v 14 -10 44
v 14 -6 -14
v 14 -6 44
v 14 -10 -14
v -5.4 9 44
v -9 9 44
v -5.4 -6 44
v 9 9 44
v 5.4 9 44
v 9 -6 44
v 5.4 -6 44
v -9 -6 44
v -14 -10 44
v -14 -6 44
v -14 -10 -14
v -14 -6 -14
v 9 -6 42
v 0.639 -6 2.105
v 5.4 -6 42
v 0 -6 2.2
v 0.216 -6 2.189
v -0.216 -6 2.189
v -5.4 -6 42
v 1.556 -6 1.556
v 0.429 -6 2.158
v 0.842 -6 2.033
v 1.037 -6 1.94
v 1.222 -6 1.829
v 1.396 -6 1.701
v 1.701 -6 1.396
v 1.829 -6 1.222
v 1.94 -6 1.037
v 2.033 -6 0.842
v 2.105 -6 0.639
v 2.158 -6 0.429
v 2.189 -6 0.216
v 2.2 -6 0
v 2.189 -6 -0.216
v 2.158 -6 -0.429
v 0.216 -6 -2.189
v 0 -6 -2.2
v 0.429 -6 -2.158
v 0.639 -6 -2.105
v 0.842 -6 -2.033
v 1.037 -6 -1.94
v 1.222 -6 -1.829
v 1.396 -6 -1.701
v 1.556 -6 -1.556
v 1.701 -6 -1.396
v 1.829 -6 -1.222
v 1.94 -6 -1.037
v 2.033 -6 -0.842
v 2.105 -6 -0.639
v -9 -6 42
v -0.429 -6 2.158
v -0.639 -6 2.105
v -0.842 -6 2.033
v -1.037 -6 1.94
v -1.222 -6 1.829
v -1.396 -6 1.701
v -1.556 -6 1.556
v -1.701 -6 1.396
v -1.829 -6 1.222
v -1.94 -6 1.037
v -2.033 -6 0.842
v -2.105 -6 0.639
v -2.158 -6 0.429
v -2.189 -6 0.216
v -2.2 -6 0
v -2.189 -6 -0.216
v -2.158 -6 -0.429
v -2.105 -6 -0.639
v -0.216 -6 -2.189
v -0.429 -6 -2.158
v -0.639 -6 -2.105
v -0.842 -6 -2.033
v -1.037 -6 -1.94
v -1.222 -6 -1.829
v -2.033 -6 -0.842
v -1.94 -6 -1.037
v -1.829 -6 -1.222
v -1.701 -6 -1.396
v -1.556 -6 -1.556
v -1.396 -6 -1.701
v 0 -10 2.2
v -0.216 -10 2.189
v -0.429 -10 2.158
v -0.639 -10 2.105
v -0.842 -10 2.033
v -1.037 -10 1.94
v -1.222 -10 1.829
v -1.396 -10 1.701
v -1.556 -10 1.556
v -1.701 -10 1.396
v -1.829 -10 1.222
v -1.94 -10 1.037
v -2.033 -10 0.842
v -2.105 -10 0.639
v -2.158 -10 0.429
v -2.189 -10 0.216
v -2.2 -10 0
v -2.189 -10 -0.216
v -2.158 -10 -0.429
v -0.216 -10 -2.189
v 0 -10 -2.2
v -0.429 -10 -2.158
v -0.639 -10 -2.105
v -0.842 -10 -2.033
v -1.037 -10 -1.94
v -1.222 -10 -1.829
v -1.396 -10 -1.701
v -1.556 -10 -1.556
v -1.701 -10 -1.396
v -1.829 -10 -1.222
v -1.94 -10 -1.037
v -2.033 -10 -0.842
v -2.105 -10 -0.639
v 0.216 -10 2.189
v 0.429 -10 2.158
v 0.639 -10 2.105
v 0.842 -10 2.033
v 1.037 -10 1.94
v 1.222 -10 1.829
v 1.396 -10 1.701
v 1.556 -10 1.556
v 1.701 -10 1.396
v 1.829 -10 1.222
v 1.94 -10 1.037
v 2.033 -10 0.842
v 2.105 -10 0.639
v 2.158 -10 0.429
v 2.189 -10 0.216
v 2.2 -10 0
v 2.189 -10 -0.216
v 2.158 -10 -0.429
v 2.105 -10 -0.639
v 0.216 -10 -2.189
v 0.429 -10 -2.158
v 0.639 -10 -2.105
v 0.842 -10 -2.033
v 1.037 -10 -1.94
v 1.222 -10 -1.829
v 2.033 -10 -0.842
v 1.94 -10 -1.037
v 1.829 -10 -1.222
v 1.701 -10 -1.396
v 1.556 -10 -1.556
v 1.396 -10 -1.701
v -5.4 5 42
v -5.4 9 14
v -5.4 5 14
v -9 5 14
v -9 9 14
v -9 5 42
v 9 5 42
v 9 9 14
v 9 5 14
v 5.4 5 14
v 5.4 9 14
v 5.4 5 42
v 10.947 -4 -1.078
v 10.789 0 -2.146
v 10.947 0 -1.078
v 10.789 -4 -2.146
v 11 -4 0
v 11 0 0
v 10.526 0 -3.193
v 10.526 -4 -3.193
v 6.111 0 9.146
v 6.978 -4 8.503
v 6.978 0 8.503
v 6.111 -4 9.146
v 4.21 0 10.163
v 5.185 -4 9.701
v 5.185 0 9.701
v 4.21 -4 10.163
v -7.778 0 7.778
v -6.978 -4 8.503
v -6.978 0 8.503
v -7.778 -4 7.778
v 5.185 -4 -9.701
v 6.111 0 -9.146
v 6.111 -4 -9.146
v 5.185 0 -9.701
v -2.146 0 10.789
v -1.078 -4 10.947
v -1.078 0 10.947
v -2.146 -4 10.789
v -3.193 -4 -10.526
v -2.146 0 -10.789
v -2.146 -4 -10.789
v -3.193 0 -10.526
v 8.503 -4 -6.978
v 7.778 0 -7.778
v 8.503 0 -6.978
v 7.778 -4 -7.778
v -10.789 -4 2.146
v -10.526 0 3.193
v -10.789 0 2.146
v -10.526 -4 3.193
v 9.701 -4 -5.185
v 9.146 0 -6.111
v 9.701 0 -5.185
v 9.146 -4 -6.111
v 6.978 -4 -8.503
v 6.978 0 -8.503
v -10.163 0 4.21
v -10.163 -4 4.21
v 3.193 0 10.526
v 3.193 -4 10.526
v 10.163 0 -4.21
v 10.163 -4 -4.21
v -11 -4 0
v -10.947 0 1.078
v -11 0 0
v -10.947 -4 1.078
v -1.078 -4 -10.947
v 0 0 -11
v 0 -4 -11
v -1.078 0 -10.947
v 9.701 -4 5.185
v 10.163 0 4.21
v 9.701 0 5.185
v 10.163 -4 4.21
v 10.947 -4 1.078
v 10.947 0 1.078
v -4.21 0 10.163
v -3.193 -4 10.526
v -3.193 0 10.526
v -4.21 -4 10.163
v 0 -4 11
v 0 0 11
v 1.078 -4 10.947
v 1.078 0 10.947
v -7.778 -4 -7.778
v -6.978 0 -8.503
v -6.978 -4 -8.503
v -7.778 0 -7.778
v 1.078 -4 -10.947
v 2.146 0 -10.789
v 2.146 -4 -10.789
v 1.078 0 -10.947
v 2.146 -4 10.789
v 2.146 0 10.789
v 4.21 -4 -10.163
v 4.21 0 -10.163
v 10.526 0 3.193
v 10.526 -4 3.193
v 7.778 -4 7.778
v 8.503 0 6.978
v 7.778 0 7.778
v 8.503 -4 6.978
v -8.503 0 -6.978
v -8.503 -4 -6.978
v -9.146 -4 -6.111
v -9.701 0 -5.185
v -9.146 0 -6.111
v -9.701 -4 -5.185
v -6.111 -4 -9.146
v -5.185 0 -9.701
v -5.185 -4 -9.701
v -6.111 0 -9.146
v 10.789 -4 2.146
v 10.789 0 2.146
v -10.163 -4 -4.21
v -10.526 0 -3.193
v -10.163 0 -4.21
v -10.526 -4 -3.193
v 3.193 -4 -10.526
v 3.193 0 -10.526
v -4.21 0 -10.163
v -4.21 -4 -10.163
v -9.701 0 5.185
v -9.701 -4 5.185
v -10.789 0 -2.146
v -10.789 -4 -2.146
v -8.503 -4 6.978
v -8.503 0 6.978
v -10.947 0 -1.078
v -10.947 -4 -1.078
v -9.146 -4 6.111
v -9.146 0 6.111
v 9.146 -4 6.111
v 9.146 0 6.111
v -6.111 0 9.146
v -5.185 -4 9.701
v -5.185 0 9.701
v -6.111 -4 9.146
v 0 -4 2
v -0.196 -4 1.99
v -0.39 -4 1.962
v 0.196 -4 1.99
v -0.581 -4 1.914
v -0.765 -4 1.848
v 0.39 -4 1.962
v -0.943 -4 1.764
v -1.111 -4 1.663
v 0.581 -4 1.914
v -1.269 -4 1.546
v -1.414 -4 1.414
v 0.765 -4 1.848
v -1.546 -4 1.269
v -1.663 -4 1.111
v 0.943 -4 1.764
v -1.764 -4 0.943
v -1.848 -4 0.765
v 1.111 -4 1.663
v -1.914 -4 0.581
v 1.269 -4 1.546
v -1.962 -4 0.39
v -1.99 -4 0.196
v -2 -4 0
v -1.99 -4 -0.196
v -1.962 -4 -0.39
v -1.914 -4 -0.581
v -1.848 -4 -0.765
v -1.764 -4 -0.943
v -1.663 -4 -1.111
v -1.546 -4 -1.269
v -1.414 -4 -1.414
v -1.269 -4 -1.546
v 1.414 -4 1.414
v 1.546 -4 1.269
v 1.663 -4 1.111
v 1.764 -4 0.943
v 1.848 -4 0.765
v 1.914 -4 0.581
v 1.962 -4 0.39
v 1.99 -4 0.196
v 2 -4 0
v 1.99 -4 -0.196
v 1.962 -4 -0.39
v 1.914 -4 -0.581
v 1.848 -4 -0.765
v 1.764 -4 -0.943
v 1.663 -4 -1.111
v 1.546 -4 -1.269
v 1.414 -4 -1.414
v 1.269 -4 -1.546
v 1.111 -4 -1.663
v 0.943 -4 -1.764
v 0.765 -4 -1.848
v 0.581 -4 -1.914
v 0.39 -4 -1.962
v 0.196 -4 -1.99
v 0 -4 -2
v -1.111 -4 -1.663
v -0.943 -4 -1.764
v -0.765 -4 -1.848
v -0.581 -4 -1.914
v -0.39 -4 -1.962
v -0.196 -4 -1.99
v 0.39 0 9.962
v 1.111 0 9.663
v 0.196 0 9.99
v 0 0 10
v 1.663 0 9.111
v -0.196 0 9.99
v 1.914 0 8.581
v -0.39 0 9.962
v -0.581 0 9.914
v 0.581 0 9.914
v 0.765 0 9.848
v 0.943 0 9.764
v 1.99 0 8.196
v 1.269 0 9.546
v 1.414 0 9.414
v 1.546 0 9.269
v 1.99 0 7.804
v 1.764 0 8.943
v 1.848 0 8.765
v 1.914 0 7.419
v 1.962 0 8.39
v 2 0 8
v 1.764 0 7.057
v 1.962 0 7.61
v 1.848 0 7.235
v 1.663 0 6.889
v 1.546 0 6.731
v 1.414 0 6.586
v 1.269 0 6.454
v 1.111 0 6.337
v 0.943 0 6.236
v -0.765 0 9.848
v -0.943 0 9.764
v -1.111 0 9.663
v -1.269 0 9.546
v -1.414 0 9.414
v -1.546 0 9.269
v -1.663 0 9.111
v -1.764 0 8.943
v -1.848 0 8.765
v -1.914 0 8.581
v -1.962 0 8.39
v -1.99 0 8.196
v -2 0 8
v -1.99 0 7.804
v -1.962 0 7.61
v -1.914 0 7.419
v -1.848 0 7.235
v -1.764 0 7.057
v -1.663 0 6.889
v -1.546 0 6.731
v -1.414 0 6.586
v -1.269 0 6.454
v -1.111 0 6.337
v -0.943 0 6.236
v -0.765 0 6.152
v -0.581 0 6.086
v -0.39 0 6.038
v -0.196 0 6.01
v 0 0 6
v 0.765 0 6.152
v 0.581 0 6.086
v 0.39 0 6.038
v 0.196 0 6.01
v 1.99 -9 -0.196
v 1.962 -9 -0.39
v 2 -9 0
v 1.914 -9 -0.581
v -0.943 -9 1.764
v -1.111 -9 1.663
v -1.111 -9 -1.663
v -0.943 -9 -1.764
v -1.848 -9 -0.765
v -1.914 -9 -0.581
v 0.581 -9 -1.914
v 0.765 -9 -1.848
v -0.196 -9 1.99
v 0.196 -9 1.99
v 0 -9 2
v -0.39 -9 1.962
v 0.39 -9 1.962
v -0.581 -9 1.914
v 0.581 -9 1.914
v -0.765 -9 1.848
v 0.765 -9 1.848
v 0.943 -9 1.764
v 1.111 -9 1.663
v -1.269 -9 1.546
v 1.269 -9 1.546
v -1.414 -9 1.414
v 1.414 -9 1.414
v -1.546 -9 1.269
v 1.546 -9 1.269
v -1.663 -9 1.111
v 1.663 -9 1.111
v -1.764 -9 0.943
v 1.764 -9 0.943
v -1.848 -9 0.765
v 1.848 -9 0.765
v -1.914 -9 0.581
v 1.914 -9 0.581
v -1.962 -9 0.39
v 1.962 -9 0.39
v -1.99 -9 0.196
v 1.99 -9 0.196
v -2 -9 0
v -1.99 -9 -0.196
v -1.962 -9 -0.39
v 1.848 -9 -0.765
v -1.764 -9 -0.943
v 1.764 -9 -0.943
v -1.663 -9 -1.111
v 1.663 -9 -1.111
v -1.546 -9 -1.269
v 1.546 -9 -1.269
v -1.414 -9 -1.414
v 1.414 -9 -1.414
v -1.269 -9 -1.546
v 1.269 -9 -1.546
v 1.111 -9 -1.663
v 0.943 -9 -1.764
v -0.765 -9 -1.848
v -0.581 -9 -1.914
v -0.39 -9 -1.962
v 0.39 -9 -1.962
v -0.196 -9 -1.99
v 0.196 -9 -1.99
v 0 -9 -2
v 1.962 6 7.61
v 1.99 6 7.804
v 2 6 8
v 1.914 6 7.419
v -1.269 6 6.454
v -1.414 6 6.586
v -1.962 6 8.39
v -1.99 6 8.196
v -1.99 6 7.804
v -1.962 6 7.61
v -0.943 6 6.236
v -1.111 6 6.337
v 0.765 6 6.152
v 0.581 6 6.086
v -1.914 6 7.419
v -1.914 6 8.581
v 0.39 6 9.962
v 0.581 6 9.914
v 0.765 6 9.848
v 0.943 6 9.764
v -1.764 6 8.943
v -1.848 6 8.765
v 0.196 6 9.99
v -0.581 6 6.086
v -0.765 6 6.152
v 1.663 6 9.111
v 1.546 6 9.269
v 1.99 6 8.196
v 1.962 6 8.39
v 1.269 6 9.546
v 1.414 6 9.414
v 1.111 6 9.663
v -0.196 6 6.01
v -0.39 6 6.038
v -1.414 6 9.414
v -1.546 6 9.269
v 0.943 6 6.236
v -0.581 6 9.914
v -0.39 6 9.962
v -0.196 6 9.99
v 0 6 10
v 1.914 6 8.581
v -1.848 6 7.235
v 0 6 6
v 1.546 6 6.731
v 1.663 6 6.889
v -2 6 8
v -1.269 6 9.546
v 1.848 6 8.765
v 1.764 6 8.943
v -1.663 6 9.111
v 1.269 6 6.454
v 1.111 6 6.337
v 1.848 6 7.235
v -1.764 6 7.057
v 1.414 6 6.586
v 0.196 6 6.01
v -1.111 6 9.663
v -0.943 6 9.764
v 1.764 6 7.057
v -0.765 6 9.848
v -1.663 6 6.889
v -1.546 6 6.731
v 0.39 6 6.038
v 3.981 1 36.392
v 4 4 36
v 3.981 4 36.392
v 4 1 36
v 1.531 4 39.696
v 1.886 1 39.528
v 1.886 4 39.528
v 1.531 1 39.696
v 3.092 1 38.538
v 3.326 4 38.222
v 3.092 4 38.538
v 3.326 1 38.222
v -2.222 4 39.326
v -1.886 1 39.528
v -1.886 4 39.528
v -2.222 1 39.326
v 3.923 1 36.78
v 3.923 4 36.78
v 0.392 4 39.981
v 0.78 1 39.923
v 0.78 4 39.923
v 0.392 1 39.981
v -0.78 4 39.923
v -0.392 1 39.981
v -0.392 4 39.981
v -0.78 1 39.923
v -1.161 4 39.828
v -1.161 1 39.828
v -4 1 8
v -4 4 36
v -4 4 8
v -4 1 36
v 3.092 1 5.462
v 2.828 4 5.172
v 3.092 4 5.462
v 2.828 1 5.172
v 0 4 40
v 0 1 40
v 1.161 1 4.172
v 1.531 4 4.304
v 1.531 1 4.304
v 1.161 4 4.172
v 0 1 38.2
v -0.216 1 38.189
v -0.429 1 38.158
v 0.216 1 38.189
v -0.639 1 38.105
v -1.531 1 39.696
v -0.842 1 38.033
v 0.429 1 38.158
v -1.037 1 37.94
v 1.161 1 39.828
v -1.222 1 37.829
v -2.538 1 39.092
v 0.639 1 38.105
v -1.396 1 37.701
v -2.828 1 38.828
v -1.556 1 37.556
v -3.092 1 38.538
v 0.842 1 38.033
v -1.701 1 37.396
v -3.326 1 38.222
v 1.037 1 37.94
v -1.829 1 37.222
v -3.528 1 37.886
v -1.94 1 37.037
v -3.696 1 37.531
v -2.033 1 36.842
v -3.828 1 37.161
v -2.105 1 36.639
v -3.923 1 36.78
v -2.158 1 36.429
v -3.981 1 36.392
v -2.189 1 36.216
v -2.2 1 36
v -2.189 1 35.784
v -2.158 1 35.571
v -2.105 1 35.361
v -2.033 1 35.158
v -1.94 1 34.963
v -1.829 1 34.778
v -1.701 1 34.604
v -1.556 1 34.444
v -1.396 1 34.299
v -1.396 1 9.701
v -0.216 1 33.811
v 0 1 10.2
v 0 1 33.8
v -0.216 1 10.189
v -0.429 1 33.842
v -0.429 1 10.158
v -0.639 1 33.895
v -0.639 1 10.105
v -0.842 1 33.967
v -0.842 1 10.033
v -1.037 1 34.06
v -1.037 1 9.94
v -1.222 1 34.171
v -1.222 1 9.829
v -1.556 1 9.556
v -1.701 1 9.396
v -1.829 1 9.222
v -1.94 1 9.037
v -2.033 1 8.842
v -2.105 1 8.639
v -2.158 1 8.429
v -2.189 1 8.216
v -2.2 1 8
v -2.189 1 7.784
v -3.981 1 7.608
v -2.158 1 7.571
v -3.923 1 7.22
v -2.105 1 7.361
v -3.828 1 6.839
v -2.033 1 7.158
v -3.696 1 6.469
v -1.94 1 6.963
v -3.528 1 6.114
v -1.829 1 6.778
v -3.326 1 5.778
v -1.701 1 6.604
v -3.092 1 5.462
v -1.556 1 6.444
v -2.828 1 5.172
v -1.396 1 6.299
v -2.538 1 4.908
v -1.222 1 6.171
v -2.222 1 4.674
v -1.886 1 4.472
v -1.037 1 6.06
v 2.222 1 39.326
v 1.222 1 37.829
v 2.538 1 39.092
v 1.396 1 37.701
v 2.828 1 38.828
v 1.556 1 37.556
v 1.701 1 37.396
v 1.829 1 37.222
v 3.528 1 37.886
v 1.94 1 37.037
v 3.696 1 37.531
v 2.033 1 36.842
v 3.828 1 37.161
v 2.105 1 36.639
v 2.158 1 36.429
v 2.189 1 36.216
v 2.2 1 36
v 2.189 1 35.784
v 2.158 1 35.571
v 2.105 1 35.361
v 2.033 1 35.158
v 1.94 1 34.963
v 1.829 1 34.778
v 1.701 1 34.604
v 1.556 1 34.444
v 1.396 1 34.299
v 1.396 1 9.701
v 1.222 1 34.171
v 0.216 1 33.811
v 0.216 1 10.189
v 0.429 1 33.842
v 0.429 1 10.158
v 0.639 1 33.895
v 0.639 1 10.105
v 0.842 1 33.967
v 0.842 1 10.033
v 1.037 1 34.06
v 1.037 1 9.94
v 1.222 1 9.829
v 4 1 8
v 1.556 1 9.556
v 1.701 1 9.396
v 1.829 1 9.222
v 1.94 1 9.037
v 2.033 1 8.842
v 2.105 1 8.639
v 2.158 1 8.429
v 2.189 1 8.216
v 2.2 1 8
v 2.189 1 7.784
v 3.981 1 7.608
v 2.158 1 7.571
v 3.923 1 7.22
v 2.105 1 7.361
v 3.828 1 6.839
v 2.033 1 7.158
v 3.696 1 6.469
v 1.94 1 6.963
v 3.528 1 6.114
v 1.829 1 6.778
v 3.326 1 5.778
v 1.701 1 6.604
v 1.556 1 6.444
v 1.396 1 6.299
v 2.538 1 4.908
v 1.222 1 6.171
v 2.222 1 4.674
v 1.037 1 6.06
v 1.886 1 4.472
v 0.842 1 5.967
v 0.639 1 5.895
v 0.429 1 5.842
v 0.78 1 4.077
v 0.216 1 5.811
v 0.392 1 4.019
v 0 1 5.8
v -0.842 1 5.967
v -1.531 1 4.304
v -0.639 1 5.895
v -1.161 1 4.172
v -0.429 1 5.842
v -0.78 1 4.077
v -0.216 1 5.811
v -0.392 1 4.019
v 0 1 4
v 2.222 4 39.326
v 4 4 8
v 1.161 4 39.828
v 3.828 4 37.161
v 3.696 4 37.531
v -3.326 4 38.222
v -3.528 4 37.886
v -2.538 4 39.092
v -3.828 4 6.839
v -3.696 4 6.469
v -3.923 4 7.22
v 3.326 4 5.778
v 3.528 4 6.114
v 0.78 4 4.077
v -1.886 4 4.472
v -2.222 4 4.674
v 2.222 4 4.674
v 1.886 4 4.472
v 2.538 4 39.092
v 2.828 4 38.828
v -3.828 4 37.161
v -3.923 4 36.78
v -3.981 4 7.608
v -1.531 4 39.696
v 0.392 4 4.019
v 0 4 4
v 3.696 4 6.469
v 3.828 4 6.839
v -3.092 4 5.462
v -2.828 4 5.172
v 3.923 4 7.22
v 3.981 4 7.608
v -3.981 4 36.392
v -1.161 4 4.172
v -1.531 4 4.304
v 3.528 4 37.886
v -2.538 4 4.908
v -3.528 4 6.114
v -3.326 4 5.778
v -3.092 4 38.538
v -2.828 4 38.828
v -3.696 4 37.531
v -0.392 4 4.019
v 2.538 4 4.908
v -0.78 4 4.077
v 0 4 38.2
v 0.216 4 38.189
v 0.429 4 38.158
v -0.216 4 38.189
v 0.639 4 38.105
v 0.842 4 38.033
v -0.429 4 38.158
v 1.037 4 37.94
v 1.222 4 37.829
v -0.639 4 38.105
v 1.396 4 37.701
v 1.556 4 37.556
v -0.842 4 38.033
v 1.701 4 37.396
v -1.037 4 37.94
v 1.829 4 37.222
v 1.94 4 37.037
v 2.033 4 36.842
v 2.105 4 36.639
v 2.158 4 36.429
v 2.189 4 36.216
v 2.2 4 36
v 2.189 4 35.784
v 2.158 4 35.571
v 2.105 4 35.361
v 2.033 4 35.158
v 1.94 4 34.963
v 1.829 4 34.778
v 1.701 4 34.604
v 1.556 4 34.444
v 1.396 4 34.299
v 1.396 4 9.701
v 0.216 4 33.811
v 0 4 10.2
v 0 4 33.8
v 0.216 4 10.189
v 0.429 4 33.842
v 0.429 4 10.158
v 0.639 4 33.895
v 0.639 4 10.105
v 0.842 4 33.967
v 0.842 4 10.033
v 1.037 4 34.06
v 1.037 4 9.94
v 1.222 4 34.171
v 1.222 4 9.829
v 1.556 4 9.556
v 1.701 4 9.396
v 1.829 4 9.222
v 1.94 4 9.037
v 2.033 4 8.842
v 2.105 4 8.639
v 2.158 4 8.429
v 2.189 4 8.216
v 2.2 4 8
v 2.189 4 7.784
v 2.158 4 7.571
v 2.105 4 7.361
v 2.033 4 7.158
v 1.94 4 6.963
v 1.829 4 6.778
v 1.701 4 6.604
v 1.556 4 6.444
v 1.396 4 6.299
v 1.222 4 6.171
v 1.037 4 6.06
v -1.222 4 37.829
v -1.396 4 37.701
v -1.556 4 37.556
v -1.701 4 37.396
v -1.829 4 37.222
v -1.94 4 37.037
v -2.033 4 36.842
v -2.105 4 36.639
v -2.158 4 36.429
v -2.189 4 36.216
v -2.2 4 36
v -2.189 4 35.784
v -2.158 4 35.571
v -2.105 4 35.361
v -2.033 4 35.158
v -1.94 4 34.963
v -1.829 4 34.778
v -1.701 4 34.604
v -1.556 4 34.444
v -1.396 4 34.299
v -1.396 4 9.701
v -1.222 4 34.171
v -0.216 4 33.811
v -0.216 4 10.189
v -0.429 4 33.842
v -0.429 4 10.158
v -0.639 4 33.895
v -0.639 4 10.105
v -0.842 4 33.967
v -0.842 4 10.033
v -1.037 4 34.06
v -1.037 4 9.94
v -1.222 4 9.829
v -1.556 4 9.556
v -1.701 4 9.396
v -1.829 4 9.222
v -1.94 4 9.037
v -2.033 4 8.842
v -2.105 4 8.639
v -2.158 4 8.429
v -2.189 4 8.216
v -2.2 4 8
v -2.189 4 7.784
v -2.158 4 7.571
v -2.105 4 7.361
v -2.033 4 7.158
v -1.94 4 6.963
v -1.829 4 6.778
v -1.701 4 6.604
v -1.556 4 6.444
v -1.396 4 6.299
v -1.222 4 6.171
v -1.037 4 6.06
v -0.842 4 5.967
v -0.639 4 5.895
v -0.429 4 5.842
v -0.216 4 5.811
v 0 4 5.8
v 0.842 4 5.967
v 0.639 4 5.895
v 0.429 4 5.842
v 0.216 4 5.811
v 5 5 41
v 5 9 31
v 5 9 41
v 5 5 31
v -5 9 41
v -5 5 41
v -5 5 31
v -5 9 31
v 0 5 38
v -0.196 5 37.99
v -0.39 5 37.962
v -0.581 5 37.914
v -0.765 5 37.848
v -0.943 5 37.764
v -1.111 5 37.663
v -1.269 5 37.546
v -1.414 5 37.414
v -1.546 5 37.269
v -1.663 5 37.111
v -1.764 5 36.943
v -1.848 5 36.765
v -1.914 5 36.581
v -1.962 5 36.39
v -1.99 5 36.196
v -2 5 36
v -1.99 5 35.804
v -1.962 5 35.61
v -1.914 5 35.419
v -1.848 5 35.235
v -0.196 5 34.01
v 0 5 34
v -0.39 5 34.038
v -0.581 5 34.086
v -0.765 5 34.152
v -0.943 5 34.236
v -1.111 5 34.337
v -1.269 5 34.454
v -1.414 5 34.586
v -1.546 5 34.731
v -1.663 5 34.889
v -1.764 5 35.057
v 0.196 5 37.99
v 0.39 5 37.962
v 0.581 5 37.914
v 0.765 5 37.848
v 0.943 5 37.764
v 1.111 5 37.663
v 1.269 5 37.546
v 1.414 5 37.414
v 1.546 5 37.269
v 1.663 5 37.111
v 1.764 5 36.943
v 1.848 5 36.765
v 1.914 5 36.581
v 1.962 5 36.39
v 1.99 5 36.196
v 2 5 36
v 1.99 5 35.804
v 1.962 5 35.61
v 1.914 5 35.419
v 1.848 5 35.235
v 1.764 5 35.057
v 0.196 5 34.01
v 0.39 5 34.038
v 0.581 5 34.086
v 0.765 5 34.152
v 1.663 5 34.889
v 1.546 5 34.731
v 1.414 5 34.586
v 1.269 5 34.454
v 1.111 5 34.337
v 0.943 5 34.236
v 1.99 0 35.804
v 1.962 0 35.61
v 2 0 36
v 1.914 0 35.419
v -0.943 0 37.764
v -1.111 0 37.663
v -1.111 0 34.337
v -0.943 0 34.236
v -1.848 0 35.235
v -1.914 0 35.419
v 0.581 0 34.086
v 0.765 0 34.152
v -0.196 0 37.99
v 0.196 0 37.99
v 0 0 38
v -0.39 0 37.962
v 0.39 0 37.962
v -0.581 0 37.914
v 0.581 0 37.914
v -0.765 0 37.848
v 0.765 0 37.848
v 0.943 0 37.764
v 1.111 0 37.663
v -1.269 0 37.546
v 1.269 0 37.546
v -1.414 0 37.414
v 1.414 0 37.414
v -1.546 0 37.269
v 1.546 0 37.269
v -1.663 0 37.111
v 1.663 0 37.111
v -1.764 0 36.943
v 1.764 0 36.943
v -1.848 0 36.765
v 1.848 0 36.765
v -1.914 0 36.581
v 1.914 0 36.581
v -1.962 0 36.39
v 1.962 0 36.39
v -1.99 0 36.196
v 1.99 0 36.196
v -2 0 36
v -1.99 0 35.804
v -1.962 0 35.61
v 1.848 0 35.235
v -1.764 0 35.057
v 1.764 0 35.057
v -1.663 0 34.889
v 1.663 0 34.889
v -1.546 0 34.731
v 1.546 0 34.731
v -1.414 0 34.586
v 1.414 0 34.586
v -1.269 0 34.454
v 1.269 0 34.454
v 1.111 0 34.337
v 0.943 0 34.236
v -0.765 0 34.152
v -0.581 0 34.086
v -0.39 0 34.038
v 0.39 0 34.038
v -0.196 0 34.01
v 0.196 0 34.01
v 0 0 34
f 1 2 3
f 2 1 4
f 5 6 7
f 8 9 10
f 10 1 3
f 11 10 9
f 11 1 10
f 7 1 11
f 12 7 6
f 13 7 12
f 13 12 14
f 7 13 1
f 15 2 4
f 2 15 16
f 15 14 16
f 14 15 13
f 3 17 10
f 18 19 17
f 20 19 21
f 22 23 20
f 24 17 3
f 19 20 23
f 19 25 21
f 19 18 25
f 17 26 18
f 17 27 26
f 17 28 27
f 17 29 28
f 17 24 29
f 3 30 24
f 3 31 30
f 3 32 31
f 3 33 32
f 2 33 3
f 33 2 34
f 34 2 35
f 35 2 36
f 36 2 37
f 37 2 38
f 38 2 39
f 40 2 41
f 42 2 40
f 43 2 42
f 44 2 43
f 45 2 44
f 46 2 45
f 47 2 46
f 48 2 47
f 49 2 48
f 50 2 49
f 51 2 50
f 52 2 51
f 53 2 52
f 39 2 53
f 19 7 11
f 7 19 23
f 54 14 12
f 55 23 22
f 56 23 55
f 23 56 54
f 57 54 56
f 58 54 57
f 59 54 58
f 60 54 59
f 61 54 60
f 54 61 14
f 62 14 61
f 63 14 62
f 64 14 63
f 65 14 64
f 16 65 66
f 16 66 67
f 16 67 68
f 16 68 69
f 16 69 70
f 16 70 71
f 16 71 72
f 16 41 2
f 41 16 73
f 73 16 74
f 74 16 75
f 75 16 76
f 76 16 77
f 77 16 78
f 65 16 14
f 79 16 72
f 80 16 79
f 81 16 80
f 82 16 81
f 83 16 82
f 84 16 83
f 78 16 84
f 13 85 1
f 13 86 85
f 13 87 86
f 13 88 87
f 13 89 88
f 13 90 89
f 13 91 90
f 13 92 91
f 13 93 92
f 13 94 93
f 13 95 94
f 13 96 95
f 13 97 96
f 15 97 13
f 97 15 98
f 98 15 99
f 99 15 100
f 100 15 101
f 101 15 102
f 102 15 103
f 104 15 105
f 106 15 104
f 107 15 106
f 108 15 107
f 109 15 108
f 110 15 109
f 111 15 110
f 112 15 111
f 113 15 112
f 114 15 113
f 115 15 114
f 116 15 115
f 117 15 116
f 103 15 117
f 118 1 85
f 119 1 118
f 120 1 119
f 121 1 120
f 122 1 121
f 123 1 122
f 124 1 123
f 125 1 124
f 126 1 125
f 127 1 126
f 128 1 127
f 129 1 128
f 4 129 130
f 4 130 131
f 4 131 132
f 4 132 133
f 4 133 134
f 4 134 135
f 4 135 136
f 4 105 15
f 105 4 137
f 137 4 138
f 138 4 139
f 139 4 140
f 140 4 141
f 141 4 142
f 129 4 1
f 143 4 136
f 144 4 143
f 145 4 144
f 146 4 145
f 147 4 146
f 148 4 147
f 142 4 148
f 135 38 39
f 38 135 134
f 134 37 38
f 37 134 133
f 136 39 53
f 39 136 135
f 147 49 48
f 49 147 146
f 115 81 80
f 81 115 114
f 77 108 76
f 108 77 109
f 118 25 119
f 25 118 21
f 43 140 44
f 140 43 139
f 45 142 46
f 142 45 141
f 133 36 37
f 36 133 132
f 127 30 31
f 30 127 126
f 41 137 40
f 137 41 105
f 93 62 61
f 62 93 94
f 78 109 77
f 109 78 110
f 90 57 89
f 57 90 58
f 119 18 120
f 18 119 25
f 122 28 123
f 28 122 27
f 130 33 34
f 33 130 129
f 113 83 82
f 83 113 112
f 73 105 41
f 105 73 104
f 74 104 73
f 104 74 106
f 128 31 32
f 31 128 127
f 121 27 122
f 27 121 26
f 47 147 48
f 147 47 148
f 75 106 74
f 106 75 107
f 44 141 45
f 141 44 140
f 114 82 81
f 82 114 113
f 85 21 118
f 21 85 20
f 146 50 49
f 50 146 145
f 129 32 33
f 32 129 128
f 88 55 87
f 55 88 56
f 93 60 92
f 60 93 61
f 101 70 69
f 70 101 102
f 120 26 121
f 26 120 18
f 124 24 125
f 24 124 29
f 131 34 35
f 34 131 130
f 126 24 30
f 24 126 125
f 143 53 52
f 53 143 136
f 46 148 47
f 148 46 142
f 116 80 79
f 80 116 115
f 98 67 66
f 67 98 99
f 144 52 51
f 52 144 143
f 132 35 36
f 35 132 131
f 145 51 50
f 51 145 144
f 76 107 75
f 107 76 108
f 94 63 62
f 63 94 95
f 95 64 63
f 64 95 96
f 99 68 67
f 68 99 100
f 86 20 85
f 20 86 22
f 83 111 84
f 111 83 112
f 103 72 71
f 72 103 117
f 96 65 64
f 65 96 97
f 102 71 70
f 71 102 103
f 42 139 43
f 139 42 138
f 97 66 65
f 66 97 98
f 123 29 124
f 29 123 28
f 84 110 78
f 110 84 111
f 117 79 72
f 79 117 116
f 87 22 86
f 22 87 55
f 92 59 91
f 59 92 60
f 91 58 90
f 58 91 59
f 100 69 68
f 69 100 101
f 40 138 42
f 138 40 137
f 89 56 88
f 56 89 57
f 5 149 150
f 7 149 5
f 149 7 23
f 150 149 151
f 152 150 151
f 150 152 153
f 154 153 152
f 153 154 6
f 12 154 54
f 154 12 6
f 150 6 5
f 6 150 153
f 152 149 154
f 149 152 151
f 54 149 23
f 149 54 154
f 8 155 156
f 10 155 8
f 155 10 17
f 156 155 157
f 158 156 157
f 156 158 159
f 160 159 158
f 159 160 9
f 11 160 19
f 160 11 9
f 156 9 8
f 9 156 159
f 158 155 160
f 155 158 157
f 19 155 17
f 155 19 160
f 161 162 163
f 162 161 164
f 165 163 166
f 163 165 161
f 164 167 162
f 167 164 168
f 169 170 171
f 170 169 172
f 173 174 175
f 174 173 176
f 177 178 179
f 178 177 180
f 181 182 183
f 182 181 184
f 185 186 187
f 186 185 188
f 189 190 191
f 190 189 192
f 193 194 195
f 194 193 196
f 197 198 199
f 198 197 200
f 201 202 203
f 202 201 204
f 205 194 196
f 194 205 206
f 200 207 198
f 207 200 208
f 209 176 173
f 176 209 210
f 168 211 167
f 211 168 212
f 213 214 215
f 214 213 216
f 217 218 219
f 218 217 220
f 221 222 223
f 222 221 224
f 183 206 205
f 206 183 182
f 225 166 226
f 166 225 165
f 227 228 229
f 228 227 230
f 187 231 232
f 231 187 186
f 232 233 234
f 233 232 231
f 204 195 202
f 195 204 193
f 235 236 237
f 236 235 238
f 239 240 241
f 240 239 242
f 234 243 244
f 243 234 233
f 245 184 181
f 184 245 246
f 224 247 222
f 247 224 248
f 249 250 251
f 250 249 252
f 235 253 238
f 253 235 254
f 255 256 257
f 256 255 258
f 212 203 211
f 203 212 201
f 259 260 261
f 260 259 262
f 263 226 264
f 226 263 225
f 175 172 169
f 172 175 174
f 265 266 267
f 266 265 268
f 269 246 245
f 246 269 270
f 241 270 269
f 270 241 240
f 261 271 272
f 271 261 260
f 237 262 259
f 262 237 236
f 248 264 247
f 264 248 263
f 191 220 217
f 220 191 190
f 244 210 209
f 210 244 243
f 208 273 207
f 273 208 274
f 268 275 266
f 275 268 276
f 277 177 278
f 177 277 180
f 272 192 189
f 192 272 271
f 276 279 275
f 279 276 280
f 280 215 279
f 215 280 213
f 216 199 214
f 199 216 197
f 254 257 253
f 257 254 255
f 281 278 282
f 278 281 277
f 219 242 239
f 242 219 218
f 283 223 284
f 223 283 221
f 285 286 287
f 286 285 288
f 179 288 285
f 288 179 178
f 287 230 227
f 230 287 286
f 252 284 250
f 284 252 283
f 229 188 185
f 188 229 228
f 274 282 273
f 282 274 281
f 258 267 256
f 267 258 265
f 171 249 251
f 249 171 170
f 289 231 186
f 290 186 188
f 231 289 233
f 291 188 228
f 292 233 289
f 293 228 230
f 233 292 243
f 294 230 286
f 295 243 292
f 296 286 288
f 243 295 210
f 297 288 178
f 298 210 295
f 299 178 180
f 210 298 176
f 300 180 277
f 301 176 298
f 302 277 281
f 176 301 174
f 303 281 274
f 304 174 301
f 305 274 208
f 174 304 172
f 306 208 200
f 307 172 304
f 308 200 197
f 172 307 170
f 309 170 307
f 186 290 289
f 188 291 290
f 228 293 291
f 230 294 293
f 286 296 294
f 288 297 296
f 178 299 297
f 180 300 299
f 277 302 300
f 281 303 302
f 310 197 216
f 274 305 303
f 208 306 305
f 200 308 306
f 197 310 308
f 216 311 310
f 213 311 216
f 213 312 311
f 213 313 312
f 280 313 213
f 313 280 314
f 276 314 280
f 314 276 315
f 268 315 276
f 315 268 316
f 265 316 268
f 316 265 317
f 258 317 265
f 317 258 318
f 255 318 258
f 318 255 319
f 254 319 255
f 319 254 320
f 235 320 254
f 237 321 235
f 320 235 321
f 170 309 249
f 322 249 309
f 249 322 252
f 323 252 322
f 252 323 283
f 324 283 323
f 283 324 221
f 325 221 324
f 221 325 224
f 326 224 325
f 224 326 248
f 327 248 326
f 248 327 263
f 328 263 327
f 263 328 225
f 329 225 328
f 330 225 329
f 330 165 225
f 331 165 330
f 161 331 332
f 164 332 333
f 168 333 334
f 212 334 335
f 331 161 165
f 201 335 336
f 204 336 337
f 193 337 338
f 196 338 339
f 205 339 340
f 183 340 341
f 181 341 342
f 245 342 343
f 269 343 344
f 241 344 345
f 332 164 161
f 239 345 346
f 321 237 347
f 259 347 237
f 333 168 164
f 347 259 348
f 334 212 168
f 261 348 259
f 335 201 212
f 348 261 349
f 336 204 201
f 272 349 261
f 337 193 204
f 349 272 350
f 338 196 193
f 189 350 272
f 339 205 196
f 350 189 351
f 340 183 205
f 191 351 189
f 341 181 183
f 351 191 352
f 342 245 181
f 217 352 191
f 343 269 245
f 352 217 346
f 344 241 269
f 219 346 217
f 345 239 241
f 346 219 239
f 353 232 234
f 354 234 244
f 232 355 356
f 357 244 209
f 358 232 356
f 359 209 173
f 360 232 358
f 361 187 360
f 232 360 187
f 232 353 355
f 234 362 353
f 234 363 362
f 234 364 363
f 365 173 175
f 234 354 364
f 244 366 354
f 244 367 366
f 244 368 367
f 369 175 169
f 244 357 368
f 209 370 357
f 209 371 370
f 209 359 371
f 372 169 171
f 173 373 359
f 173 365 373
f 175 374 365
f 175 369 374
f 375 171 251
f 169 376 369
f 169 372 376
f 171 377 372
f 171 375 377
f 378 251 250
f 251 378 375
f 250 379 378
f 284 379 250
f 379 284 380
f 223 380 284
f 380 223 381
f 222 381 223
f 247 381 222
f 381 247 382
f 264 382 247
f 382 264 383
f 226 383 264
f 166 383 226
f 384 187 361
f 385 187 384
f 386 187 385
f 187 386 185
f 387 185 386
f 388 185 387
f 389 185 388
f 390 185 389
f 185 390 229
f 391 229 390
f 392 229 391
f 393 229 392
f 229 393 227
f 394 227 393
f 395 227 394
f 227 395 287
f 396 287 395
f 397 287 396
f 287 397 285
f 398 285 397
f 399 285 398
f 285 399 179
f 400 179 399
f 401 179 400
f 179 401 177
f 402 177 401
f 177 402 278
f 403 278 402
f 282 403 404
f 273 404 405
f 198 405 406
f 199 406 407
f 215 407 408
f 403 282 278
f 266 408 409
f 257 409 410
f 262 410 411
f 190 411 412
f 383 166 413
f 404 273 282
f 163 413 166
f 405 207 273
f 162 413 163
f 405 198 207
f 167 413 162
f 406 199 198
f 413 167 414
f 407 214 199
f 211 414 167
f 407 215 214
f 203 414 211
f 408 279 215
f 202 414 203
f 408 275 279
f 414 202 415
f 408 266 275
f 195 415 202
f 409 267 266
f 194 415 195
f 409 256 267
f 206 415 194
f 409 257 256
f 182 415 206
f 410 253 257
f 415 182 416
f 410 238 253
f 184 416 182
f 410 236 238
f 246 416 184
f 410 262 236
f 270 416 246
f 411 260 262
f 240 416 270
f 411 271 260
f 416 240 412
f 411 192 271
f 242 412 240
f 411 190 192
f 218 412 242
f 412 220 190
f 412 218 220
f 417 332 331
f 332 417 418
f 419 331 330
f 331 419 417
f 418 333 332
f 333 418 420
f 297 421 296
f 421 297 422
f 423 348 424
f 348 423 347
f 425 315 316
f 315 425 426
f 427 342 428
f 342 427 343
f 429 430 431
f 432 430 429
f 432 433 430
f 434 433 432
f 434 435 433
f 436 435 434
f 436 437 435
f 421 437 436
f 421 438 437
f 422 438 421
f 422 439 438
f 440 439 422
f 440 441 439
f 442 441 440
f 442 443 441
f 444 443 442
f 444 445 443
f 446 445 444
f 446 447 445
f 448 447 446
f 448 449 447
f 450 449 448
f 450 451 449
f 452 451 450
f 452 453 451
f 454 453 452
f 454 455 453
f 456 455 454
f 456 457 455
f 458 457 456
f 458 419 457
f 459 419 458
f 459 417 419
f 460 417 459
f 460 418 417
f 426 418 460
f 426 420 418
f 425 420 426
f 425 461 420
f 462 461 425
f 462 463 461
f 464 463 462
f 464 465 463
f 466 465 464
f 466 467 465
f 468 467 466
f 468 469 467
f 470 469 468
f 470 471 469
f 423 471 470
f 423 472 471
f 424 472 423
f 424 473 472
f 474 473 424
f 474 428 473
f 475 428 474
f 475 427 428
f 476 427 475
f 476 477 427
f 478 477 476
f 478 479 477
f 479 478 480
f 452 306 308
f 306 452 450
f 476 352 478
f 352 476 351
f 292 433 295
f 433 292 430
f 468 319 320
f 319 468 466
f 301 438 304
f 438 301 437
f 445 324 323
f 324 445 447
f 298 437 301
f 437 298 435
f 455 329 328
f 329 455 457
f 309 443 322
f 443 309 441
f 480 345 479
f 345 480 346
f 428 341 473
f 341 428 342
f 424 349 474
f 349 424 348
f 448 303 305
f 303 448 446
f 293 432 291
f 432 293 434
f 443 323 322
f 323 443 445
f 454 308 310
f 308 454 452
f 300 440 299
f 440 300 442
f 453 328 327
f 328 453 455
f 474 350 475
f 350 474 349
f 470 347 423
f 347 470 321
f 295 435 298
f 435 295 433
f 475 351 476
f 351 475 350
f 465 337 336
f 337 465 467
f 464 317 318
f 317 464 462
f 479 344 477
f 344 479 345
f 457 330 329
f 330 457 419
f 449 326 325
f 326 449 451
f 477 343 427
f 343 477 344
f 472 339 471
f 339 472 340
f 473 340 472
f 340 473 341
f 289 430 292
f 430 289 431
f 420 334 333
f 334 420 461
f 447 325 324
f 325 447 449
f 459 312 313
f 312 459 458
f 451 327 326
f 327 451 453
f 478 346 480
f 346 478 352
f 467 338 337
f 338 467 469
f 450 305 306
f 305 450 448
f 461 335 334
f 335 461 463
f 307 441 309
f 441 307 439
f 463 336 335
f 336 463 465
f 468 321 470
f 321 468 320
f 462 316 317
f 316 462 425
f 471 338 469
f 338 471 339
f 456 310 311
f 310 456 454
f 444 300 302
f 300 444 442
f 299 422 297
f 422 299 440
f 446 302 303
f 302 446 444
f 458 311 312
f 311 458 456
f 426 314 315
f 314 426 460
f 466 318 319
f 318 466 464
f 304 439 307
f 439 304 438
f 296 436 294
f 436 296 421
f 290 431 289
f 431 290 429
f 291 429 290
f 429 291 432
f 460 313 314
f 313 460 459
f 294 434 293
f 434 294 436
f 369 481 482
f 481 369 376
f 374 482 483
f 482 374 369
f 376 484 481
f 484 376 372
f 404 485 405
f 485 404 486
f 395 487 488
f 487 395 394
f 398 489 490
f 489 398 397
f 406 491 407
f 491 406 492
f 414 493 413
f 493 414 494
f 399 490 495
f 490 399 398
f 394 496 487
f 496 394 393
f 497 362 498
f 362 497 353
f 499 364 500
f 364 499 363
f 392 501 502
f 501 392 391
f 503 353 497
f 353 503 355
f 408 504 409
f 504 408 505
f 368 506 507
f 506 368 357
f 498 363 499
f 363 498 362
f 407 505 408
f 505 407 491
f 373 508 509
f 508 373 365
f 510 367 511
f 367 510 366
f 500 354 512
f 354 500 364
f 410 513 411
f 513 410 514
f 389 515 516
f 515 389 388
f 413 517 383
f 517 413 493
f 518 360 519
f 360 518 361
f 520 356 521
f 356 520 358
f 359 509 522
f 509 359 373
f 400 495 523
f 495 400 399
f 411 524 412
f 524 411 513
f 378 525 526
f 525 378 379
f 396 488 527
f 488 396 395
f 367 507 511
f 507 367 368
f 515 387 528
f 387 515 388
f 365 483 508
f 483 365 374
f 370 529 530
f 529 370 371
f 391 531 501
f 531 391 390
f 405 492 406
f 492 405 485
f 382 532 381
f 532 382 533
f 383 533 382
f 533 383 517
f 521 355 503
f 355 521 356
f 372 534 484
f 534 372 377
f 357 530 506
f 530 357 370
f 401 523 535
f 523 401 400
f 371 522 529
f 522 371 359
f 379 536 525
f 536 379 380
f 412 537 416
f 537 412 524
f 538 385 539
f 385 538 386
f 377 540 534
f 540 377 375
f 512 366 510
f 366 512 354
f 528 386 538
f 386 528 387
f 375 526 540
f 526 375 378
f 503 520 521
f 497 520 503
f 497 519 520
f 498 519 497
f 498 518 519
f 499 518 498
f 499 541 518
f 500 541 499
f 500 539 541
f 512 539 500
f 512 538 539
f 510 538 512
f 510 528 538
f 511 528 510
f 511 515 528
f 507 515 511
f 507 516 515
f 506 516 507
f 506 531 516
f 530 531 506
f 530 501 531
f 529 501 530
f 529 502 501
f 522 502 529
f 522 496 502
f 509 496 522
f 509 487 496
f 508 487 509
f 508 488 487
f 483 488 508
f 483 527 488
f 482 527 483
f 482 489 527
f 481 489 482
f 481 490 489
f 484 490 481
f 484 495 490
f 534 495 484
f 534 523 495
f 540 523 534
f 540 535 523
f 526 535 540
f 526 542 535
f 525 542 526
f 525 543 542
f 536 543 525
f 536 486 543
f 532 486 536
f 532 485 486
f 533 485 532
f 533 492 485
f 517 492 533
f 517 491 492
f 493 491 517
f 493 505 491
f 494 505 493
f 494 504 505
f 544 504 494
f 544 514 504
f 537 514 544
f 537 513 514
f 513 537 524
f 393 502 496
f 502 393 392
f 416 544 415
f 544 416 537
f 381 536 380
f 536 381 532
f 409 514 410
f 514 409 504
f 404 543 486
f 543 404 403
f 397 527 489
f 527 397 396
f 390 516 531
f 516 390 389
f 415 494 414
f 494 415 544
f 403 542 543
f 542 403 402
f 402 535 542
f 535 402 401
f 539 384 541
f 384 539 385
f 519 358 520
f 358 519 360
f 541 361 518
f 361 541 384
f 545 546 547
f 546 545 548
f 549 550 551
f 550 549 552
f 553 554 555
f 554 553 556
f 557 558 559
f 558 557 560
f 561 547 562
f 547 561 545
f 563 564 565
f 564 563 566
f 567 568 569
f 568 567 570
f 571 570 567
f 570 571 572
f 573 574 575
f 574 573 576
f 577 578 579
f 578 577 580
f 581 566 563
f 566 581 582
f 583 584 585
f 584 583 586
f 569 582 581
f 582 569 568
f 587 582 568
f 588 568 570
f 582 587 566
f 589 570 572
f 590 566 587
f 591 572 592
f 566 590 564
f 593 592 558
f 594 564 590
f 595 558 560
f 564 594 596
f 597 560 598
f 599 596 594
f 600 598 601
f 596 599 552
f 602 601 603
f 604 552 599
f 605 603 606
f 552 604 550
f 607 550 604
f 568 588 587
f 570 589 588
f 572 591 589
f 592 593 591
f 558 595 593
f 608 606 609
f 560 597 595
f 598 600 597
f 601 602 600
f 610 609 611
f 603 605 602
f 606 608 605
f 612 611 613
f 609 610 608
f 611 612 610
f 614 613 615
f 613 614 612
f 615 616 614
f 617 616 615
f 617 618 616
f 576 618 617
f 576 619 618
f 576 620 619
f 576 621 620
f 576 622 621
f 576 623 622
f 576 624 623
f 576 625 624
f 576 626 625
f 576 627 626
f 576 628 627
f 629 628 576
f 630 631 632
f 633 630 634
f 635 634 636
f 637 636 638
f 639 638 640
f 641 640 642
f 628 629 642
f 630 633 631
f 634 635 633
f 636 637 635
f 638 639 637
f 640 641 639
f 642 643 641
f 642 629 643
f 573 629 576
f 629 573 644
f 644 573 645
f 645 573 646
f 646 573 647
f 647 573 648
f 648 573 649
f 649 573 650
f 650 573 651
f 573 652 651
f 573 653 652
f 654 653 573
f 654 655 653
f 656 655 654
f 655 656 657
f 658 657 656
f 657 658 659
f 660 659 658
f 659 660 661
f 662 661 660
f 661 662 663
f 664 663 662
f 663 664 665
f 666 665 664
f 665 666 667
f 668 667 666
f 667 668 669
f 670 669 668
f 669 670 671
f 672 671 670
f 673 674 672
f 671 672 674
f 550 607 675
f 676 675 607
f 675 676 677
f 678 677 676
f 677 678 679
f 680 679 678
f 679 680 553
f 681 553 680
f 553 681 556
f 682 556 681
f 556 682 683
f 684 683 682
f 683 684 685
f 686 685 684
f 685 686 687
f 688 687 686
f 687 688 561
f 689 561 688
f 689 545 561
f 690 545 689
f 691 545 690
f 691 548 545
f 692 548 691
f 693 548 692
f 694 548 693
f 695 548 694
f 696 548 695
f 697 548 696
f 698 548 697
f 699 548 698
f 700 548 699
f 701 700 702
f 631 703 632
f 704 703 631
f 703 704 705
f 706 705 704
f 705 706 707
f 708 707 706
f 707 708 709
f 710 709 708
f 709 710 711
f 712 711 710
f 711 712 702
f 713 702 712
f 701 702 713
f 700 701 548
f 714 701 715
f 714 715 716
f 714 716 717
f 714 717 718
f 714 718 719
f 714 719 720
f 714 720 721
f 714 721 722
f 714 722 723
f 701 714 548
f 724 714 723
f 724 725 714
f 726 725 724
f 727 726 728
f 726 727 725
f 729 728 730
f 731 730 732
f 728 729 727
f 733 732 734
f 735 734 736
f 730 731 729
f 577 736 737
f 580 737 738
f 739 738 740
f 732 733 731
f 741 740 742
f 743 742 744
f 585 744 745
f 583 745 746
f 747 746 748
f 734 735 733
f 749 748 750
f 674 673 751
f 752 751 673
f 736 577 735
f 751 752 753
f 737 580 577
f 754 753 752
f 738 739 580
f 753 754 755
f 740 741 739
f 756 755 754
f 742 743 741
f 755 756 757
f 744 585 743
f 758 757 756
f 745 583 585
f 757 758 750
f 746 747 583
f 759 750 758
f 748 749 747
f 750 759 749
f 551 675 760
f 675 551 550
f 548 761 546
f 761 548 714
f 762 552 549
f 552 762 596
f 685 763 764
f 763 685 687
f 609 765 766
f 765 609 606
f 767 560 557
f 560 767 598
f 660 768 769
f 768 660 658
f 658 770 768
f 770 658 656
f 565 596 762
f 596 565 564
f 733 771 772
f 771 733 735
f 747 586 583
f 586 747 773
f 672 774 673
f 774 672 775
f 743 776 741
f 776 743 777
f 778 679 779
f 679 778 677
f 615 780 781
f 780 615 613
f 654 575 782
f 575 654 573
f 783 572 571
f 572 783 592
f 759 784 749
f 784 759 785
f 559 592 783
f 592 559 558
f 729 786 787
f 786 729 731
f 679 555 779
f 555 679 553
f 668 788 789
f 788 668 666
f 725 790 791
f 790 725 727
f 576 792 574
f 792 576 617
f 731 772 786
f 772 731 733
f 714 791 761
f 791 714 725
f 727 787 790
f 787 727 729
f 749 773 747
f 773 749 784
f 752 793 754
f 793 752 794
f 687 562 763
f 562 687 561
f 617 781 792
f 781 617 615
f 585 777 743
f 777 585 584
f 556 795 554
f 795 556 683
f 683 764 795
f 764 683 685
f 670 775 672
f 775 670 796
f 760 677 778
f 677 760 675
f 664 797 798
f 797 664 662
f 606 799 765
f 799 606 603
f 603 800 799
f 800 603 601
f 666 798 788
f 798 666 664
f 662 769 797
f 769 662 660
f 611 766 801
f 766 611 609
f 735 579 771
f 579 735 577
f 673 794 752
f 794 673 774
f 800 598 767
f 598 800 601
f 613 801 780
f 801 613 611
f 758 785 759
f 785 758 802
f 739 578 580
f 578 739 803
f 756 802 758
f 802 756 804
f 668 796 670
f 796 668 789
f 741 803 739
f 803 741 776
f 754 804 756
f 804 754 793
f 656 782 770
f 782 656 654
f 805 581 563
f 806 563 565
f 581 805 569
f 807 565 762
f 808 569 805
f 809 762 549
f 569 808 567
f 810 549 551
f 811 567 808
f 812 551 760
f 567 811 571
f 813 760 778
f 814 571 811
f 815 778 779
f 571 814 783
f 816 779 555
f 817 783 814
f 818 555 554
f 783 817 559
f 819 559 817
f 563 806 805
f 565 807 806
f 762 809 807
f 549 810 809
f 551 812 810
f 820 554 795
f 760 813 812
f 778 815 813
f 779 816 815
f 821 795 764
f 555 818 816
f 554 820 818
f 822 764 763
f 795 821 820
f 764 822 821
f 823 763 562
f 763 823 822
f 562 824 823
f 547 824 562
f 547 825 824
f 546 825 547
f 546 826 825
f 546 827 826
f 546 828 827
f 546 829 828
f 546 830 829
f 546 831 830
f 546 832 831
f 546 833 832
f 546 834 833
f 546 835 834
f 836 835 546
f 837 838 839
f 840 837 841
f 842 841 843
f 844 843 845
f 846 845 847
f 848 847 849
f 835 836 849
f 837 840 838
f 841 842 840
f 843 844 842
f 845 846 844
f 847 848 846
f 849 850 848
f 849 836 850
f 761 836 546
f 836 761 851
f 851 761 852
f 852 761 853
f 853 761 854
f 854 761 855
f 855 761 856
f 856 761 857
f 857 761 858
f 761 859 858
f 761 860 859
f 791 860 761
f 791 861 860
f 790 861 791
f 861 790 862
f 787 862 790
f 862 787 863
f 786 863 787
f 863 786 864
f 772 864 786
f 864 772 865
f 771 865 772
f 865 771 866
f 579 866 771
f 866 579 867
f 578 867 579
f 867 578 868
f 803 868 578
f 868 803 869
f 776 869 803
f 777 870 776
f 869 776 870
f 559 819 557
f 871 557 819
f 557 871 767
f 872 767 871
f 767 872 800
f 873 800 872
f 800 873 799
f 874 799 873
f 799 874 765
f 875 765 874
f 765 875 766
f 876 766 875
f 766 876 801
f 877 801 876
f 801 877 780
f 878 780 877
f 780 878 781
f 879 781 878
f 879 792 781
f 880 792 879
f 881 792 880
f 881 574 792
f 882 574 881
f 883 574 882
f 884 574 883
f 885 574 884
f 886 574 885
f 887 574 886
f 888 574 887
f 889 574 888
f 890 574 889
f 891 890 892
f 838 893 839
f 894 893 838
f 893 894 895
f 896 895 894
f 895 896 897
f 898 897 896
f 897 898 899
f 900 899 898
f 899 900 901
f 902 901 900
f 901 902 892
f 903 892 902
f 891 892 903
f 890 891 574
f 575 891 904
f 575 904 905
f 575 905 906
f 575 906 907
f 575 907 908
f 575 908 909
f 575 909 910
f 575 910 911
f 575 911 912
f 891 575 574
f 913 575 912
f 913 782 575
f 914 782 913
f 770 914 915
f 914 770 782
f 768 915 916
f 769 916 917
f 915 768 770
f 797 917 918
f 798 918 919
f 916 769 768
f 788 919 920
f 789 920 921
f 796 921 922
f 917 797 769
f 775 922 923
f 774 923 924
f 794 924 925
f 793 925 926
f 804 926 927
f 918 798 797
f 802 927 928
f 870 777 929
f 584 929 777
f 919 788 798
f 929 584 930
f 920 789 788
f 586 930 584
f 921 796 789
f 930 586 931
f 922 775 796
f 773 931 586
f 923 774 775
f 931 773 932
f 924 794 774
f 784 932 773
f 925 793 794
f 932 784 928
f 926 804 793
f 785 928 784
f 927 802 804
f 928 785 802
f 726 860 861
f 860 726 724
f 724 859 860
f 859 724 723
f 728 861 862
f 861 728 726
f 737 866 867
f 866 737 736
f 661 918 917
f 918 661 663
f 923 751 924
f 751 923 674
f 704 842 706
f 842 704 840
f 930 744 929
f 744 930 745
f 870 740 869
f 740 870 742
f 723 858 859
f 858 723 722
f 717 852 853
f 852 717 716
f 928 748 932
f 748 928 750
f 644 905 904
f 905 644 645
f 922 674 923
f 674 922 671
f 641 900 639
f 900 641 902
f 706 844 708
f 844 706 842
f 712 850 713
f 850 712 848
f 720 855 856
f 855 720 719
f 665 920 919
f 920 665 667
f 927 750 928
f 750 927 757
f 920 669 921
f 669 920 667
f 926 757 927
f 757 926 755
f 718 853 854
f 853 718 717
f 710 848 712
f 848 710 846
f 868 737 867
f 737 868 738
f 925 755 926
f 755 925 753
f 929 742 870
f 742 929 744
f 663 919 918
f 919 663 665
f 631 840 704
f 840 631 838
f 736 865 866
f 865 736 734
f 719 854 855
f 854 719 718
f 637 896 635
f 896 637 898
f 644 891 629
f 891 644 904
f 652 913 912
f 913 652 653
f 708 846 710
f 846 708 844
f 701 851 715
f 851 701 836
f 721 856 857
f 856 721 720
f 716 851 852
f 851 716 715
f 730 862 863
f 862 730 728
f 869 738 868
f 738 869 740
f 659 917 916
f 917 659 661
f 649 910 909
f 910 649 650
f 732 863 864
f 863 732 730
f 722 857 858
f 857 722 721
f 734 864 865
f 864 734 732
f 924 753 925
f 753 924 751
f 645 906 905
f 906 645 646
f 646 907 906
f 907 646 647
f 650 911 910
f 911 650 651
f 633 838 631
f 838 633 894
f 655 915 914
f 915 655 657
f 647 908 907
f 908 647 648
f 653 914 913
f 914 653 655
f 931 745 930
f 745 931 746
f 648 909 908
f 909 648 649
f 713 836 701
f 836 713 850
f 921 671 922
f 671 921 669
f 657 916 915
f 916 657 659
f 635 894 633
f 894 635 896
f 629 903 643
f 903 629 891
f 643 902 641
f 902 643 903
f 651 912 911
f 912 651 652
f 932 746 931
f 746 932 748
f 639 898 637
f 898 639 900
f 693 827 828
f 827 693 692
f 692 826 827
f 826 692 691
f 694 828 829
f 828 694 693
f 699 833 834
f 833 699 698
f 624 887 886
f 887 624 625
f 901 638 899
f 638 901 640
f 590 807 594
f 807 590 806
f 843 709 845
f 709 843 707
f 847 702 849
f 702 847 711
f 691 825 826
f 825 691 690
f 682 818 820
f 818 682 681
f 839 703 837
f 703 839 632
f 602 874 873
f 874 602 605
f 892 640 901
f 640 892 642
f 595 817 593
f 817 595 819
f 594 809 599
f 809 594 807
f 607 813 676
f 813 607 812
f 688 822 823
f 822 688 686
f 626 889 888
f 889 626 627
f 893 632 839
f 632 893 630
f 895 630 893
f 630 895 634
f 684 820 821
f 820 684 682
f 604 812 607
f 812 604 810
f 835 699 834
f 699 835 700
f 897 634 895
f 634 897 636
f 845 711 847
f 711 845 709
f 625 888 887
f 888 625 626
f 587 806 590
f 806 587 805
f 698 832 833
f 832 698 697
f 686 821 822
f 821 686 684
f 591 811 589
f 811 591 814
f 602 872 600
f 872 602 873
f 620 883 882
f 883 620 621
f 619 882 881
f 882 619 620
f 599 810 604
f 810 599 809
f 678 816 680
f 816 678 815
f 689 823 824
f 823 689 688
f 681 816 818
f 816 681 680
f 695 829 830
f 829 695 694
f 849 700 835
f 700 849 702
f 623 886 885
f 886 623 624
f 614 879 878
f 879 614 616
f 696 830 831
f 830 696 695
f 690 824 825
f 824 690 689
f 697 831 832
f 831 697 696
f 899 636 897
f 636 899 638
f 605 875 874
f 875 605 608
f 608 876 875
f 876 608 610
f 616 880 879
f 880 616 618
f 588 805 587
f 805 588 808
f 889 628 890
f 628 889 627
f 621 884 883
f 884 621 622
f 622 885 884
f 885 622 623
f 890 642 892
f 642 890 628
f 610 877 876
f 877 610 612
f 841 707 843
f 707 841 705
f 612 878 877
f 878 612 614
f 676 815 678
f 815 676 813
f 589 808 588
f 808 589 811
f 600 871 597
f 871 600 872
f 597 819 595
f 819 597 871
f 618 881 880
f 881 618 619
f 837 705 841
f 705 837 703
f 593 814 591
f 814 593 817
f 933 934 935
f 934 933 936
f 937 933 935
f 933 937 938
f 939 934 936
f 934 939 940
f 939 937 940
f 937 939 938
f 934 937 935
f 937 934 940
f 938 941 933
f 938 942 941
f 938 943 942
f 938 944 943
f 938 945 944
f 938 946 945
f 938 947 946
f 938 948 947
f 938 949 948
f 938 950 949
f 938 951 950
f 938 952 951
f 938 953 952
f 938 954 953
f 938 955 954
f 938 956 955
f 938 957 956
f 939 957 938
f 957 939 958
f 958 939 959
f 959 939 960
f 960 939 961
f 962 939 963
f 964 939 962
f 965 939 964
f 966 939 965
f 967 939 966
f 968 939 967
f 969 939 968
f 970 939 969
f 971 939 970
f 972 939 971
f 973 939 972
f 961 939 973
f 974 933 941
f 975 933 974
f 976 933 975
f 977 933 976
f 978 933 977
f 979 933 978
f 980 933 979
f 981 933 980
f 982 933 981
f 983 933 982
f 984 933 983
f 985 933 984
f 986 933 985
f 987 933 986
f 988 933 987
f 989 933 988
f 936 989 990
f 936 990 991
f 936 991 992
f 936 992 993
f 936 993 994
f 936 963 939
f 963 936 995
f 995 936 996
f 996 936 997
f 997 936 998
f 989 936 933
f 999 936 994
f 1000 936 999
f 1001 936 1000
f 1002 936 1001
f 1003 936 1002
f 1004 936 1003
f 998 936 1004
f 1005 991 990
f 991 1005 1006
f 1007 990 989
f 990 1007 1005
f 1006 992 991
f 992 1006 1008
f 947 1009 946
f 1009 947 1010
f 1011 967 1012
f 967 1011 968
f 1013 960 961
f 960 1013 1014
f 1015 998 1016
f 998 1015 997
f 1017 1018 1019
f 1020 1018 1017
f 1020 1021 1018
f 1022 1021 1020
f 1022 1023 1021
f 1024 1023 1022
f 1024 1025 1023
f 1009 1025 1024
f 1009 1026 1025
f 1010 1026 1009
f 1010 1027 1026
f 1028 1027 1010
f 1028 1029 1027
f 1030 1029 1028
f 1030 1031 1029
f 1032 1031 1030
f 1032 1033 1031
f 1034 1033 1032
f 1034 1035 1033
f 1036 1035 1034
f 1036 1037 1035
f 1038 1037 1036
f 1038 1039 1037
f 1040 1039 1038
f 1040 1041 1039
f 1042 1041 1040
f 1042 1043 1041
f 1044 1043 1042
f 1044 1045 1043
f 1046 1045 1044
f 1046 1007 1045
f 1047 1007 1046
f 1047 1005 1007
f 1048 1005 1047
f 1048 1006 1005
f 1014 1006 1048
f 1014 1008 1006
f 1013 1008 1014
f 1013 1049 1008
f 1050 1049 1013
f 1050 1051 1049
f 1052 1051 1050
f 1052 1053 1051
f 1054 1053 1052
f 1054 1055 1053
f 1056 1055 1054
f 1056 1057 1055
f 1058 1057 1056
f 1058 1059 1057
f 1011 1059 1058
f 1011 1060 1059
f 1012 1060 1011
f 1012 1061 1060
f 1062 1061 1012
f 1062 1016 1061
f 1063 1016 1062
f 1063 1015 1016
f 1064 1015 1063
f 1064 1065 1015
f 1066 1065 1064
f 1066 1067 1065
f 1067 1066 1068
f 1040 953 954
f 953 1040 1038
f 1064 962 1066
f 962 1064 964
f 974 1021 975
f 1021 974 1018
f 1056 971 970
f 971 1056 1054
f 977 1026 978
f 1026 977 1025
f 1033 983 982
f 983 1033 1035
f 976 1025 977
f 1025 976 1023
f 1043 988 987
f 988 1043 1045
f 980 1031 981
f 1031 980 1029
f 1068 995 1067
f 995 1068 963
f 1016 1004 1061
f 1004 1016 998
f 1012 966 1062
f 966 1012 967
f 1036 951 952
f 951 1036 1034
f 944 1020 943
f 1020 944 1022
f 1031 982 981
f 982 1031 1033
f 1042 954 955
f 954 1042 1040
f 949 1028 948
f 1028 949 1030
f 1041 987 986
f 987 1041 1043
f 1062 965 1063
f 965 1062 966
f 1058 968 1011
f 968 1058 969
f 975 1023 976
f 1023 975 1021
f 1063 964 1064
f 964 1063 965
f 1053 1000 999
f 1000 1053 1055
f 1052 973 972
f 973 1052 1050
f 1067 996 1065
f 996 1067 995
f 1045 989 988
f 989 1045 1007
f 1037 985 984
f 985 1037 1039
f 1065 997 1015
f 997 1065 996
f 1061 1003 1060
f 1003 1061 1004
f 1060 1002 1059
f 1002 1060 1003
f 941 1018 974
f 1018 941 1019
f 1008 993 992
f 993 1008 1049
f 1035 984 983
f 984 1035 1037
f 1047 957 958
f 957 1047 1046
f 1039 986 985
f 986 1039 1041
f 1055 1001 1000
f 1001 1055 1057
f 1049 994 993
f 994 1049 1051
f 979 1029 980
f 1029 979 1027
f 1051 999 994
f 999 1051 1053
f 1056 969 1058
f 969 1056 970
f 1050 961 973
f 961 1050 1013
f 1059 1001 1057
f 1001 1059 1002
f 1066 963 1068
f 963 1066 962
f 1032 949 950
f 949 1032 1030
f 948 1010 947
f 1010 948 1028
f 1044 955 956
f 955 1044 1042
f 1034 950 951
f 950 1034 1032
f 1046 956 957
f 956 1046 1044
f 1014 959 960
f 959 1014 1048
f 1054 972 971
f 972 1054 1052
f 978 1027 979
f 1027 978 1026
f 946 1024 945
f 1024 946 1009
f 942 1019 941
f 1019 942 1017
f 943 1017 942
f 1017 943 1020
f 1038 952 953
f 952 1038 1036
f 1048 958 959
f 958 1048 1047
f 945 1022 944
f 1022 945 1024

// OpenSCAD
// Original low-speed slider-crank verification fixture, millimetres.
// Four manufacturing parts. Pins are integral; external axial retention is
// required. No load capacity, print tolerance or physical function is claimed.
agentscad_part = "all";
agentscad_pose = false;
motion_angle = 0;
crank_radius = 8;
rod_length = 28;
$fn = 64;

// All pin axes are parallel to +Y; the mechanism moves in the XZ plane.
module y_cylinder(radius, height) { rotate([-90, 0, 0]) cylinder(r=radius, h=height); }
module crank_local() {
  union() {
    translate([0, -4, 0]) y_cylinder(crank_radius + 3, 4);
    translate([0, -9, 0]) y_cylinder(2, 5.1);
    translate([0, -0.1, crank_radius]) y_cylinder(2, 6.1);
  }
}
module rod_local() {
  difference() {
    hull() {
      translate([0, 1, 0]) y_cylinder(4, 3);
      translate([0, 1, rod_length]) y_cylinder(4, 3);
    }
    translate([0, 0.9, 0]) y_cylinder(2.2, 3.2);
    translate([0, 0.9, rod_length]) y_cylinder(2.2, 3.2);
  }
}
module slider_local() {
  union() {
    translate([-5, 5, -5]) cube([10, 4, 10]);
    y_cylinder(2, 5.1);
  }
}
module frame_local() {
  union() {
    difference() {
      translate([-14, -10, -14]) cube([28, 4, 58]);
      translate([0, -10.1, 0]) y_cylinder(2.2, 4.2);
    }
    for (x = [-9, 5.4]) {
      translate([x, 5, 14]) cube([3.6, 4, 30]);
      translate([x, -6.1, 42]) cube([3.6, 11.2, 2]);
    }
  }
}

// Source-side construction. The checker measures the resulting mesh contours;
// it never consumes these functions or their computed coordinates as evidence.
cx = crank_radius * sin(0);
cz = crank_radius * cos(0);
travel = sqrt(rod_length * rod_length - cx * cx);
pz = cz + travel;
rod_angle = atan2(-cx, travel);
module selected_part(id, placed) {
  if (id == "frame") frame_local();
  if (id == "crank") rotate([0, 0, 0]) crank_local();
  if (id == "rod") translate(placed ? [cx, 0, cz] : [0, 0, 0])
    rotate([0, placed ? rod_angle : 0, 0]) rod_local();
  if (id == "slider") translate([0, 0, placed ? pz : 0]) slider_local();
}
module generated_part() {
  if (agentscad_part == "all") {
    for (id = ["frame", "crank", "rod", "slider"]) selected_part(id, true);
  } else selected_part(agentscad_part, agentscad_pose);
}
generated_part();
